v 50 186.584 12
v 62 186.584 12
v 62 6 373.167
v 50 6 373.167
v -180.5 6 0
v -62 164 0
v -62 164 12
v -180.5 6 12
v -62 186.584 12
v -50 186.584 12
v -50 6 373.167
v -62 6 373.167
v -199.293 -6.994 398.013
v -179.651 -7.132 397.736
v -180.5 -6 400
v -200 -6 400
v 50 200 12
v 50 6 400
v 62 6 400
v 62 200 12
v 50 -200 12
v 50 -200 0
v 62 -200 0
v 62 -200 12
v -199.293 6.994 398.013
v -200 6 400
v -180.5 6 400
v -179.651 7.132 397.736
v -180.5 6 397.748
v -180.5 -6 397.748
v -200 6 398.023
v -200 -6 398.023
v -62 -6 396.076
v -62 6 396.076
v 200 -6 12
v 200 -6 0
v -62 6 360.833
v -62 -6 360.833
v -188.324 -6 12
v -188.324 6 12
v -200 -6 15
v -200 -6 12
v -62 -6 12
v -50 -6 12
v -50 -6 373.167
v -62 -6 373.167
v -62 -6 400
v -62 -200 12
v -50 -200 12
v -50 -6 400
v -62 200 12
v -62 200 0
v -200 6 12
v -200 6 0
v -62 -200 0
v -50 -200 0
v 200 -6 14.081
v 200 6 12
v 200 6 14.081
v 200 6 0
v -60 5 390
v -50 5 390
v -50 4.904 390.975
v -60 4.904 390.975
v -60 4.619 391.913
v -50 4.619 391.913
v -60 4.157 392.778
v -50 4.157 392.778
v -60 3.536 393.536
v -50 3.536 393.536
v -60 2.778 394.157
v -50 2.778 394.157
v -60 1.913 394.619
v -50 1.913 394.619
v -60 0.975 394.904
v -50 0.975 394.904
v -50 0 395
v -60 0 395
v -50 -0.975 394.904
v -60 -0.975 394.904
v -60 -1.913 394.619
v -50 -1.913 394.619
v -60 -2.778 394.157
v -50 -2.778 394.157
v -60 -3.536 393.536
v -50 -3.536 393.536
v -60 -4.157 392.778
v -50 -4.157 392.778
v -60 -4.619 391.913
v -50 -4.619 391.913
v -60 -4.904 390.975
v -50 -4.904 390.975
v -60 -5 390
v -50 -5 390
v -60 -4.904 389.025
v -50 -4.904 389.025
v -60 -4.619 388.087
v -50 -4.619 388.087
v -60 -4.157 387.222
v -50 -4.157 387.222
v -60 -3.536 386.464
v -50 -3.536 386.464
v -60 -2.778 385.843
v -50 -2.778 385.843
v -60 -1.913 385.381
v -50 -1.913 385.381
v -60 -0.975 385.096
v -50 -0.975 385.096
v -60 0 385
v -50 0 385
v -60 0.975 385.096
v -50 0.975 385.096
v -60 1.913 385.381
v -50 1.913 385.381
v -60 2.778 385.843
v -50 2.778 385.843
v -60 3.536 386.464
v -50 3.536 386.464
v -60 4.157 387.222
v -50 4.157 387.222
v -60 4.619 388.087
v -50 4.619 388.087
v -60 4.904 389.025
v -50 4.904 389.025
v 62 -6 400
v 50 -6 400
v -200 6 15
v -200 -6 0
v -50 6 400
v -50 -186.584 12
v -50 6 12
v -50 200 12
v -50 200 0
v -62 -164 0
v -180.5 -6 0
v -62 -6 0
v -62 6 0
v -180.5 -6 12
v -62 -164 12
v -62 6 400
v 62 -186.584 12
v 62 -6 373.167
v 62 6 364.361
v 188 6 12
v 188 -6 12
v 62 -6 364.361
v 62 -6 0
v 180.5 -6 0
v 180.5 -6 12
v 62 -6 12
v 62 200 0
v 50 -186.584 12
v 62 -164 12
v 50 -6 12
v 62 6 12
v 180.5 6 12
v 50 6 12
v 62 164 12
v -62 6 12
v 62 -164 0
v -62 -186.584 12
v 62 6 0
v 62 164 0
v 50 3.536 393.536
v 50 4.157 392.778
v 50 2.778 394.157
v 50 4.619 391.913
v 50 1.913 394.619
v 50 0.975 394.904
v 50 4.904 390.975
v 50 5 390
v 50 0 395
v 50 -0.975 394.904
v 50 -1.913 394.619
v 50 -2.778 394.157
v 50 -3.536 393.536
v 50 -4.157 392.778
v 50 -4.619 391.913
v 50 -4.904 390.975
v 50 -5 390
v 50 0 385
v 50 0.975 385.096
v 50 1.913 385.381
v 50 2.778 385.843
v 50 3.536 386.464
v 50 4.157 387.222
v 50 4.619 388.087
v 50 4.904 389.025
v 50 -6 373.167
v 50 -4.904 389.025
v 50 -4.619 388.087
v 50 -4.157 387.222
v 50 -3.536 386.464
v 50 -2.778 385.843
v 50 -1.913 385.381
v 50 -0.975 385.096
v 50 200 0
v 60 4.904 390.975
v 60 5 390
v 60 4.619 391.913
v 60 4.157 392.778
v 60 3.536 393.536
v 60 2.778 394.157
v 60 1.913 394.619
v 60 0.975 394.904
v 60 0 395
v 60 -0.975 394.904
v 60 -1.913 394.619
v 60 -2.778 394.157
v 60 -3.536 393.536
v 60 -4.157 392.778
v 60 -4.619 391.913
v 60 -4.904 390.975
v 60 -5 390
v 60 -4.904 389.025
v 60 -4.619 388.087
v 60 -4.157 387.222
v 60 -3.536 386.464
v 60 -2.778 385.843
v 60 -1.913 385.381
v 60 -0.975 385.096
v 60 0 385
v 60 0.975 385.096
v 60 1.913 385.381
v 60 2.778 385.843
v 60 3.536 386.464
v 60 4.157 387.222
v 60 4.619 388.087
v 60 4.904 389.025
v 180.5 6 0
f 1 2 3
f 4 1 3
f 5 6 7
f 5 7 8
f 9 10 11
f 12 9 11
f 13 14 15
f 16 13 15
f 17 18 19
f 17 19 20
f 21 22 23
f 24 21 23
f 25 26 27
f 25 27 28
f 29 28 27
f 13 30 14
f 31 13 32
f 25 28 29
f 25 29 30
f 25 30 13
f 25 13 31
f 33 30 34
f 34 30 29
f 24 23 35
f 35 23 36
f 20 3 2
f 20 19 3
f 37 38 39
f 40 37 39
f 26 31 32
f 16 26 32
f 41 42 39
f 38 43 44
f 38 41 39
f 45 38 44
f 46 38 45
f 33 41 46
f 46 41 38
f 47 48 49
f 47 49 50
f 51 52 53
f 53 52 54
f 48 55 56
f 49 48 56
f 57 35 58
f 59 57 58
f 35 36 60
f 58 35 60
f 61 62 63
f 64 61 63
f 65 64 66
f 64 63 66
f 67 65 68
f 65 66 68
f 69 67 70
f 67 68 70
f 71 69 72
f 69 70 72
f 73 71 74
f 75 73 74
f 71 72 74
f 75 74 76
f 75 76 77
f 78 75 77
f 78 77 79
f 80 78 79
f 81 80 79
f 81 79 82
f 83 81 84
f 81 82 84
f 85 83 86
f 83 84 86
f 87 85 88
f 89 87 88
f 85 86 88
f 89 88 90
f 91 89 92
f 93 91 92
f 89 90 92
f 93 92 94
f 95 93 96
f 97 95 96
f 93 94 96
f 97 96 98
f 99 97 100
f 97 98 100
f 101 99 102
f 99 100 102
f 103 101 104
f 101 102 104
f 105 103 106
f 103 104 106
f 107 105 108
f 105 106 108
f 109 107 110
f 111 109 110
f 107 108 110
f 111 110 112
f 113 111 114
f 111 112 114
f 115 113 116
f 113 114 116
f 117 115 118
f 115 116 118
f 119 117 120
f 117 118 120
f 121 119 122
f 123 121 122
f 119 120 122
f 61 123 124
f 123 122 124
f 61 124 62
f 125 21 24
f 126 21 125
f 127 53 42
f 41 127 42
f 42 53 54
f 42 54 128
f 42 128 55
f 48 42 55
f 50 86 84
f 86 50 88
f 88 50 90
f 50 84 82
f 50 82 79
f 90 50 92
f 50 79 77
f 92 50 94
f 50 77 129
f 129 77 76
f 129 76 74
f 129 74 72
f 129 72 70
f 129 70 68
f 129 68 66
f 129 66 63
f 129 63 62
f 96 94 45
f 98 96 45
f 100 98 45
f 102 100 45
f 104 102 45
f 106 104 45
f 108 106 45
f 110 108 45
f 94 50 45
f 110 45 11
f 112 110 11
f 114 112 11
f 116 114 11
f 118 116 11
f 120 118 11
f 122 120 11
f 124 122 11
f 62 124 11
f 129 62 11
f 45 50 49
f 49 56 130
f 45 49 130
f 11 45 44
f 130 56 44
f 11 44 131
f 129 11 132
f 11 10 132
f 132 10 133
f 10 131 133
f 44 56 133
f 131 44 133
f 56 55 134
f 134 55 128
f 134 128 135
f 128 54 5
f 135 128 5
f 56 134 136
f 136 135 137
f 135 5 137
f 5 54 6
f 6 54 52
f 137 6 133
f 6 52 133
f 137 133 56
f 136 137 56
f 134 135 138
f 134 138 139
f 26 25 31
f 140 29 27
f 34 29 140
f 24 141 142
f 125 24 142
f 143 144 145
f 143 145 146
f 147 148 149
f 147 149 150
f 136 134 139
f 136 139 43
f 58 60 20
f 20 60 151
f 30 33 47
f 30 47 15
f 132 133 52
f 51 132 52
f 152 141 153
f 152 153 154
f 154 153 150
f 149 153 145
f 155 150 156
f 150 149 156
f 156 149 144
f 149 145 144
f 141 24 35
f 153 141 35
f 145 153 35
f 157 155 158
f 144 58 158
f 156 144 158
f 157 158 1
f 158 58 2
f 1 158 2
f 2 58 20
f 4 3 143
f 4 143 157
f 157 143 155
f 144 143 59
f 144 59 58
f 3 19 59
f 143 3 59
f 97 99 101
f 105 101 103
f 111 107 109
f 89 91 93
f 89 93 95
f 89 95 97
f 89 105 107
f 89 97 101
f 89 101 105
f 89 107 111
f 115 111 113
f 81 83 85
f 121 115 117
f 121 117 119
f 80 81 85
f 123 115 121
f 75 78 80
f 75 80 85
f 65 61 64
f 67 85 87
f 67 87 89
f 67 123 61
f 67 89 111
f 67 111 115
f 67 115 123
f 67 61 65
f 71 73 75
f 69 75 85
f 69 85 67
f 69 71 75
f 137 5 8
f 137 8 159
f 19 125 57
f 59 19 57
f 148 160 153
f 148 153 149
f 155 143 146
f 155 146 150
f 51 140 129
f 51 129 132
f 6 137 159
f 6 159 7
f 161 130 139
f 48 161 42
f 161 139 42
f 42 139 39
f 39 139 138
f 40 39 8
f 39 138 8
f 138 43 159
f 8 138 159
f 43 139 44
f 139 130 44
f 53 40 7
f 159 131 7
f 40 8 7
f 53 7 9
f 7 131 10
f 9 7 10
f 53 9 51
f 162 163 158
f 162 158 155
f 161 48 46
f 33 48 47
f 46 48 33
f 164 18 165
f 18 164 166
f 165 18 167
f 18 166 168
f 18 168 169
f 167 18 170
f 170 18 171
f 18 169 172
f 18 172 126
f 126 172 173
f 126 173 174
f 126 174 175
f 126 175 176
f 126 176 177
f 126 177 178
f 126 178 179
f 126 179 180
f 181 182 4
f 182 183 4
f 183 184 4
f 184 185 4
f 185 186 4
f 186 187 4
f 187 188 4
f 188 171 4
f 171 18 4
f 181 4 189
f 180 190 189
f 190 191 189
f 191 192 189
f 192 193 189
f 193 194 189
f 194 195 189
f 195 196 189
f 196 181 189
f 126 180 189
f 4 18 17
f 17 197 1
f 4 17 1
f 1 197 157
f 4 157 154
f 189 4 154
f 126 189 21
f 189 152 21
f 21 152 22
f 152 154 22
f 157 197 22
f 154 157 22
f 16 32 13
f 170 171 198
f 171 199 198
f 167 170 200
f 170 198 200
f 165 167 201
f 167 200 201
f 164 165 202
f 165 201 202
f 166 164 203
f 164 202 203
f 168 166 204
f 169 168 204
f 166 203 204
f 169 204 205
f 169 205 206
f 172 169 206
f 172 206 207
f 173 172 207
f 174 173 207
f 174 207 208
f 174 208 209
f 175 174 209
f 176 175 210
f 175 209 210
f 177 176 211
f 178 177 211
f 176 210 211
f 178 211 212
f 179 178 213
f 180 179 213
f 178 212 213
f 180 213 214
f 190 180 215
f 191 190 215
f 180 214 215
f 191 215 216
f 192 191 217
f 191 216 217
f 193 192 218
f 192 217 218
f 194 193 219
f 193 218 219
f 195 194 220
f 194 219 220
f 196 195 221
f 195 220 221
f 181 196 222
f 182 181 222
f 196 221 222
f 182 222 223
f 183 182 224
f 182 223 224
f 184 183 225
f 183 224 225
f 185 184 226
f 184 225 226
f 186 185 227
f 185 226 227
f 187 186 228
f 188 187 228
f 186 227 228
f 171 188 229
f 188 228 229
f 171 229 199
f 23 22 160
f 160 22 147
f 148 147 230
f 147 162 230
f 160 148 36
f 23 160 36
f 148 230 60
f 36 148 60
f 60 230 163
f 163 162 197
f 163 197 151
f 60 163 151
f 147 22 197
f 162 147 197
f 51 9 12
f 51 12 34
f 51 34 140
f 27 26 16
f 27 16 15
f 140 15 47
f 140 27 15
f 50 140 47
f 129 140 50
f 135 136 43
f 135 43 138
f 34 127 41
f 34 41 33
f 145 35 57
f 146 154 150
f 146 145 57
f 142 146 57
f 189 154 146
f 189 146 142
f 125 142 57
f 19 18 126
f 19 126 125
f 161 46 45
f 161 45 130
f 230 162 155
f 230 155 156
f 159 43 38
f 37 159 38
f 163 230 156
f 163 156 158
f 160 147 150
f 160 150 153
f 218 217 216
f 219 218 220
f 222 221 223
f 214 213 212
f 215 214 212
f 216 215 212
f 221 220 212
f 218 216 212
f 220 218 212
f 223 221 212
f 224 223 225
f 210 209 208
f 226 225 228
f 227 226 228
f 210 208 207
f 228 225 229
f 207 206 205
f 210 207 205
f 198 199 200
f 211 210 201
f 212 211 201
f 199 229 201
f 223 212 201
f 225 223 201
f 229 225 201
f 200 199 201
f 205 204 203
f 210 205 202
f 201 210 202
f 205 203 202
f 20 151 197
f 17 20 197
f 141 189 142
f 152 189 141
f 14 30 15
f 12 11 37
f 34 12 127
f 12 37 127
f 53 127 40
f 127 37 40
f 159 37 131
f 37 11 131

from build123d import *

# Parameters (mm, degrees)
F2_DEPTH  = 400
F4_DEPTH  = 500
F6_DEPTH  = 500
F8_DEPTH  = 200
F10_DEPTH = 400
F11_R     = 5
F12_DEPTH = 60
F14_DEPTH = 106


with BuildPart() as f2:
    # F1 (on Top) → F2 (new body)
    with BuildSketch(Plane.XY):
        Polygon((-62, 200), (-200, 6), (-200, -6), (-62, -200), (-50, -200), (-50, 200), align=None)
        Polygon((62, 200), (50, 200), (50, -200), (62, -200), (200, -6), (200, 6), align=None)
    extrude(amount=F2_DEPTH)

    # F3 (on Front) → F4 (cut, symmetric)
    with BuildSketch(Plane.XZ):
        Polygon((-340.12854, 400), (-200, 15), (-62, 396.075697), align=None)
        Polygon((-62, 12), (-62, 360.832798), (-188.32379, 12), align=None)
    extrude(amount=F4_DEPTH, both=True, mode=Mode.SUBTRACT)

    # F5 (on Front) → F6 (cut, symmetric)
    with BuildSketch(Plane.XZ):
        Polygon((188, 12), (62, 364.360822), (62, 12), align=None)
        Polygon((200, 400), (62, 400), (200, 14.081005), align=None)
    extrude(amount=F6_DEPTH, both=True, mode=Mode.SUBTRACT)

    # F7 (on Right) → F8 (cut, symmetric)
    with BuildSketch(Plane.YZ):
        Polygon((-6, 400), (-200, 400), (-200, 12), align=None)
        Polygon((200, 12), (200, 400), (6, 400), align=None)
        Polygon((-6, 373.167184), (-186.583592, 12), (-6, 12), align=None)
        Polygon((6, 12), (186.583592, 12), (6, 373.167184), align=None)
    extrude(amount=F8_DEPTH, both=True, mode=Mode.SUBTRACT)

    # F9 (on Top) → F10 (cut)
    with BuildSketch(Plane.XY):
        Polygon((62, 6), (180.5, 6), (62, 164), align=None)
        Polygon((180.5, -6), (62, -6), (62, -164), align=None)
        Polygon((-62, 6), (-62, 164), (-180.5, 6), align=None)
        Polygon((-62, -6), (-180.5, -6), (-62, -164), align=None)
    extrude(amount=F10_DEPTH, mode=Mode.SUBTRACT)

    # F11 (on Right) → F12 (cut, symmetric)
    with BuildSketch(Plane.YZ):
        with Locations((0, 390)):
            Circle(F11_R)
    extrude(amount=F12_DEPTH, both=True, mode=Mode.SUBTRACT)

    # F13 (on offset) → F14 (cut)
    with BuildSketch(Plane.XY.offset(141)):
        Polygon((-62, -200), (-62, -6), (-200, -6), align=None)
        Polygon((-200, 6), (-62, 6), (-62, 200), align=None)
        Polygon((62, 200), (62, 6), (200, 6), align=None)
        Polygon((200, -6), (62, -6), (62, -200), align=None)
    extrude(amount=F14_DEPTH, mode=Mode.SUBTRACT)


solid = f2.part
